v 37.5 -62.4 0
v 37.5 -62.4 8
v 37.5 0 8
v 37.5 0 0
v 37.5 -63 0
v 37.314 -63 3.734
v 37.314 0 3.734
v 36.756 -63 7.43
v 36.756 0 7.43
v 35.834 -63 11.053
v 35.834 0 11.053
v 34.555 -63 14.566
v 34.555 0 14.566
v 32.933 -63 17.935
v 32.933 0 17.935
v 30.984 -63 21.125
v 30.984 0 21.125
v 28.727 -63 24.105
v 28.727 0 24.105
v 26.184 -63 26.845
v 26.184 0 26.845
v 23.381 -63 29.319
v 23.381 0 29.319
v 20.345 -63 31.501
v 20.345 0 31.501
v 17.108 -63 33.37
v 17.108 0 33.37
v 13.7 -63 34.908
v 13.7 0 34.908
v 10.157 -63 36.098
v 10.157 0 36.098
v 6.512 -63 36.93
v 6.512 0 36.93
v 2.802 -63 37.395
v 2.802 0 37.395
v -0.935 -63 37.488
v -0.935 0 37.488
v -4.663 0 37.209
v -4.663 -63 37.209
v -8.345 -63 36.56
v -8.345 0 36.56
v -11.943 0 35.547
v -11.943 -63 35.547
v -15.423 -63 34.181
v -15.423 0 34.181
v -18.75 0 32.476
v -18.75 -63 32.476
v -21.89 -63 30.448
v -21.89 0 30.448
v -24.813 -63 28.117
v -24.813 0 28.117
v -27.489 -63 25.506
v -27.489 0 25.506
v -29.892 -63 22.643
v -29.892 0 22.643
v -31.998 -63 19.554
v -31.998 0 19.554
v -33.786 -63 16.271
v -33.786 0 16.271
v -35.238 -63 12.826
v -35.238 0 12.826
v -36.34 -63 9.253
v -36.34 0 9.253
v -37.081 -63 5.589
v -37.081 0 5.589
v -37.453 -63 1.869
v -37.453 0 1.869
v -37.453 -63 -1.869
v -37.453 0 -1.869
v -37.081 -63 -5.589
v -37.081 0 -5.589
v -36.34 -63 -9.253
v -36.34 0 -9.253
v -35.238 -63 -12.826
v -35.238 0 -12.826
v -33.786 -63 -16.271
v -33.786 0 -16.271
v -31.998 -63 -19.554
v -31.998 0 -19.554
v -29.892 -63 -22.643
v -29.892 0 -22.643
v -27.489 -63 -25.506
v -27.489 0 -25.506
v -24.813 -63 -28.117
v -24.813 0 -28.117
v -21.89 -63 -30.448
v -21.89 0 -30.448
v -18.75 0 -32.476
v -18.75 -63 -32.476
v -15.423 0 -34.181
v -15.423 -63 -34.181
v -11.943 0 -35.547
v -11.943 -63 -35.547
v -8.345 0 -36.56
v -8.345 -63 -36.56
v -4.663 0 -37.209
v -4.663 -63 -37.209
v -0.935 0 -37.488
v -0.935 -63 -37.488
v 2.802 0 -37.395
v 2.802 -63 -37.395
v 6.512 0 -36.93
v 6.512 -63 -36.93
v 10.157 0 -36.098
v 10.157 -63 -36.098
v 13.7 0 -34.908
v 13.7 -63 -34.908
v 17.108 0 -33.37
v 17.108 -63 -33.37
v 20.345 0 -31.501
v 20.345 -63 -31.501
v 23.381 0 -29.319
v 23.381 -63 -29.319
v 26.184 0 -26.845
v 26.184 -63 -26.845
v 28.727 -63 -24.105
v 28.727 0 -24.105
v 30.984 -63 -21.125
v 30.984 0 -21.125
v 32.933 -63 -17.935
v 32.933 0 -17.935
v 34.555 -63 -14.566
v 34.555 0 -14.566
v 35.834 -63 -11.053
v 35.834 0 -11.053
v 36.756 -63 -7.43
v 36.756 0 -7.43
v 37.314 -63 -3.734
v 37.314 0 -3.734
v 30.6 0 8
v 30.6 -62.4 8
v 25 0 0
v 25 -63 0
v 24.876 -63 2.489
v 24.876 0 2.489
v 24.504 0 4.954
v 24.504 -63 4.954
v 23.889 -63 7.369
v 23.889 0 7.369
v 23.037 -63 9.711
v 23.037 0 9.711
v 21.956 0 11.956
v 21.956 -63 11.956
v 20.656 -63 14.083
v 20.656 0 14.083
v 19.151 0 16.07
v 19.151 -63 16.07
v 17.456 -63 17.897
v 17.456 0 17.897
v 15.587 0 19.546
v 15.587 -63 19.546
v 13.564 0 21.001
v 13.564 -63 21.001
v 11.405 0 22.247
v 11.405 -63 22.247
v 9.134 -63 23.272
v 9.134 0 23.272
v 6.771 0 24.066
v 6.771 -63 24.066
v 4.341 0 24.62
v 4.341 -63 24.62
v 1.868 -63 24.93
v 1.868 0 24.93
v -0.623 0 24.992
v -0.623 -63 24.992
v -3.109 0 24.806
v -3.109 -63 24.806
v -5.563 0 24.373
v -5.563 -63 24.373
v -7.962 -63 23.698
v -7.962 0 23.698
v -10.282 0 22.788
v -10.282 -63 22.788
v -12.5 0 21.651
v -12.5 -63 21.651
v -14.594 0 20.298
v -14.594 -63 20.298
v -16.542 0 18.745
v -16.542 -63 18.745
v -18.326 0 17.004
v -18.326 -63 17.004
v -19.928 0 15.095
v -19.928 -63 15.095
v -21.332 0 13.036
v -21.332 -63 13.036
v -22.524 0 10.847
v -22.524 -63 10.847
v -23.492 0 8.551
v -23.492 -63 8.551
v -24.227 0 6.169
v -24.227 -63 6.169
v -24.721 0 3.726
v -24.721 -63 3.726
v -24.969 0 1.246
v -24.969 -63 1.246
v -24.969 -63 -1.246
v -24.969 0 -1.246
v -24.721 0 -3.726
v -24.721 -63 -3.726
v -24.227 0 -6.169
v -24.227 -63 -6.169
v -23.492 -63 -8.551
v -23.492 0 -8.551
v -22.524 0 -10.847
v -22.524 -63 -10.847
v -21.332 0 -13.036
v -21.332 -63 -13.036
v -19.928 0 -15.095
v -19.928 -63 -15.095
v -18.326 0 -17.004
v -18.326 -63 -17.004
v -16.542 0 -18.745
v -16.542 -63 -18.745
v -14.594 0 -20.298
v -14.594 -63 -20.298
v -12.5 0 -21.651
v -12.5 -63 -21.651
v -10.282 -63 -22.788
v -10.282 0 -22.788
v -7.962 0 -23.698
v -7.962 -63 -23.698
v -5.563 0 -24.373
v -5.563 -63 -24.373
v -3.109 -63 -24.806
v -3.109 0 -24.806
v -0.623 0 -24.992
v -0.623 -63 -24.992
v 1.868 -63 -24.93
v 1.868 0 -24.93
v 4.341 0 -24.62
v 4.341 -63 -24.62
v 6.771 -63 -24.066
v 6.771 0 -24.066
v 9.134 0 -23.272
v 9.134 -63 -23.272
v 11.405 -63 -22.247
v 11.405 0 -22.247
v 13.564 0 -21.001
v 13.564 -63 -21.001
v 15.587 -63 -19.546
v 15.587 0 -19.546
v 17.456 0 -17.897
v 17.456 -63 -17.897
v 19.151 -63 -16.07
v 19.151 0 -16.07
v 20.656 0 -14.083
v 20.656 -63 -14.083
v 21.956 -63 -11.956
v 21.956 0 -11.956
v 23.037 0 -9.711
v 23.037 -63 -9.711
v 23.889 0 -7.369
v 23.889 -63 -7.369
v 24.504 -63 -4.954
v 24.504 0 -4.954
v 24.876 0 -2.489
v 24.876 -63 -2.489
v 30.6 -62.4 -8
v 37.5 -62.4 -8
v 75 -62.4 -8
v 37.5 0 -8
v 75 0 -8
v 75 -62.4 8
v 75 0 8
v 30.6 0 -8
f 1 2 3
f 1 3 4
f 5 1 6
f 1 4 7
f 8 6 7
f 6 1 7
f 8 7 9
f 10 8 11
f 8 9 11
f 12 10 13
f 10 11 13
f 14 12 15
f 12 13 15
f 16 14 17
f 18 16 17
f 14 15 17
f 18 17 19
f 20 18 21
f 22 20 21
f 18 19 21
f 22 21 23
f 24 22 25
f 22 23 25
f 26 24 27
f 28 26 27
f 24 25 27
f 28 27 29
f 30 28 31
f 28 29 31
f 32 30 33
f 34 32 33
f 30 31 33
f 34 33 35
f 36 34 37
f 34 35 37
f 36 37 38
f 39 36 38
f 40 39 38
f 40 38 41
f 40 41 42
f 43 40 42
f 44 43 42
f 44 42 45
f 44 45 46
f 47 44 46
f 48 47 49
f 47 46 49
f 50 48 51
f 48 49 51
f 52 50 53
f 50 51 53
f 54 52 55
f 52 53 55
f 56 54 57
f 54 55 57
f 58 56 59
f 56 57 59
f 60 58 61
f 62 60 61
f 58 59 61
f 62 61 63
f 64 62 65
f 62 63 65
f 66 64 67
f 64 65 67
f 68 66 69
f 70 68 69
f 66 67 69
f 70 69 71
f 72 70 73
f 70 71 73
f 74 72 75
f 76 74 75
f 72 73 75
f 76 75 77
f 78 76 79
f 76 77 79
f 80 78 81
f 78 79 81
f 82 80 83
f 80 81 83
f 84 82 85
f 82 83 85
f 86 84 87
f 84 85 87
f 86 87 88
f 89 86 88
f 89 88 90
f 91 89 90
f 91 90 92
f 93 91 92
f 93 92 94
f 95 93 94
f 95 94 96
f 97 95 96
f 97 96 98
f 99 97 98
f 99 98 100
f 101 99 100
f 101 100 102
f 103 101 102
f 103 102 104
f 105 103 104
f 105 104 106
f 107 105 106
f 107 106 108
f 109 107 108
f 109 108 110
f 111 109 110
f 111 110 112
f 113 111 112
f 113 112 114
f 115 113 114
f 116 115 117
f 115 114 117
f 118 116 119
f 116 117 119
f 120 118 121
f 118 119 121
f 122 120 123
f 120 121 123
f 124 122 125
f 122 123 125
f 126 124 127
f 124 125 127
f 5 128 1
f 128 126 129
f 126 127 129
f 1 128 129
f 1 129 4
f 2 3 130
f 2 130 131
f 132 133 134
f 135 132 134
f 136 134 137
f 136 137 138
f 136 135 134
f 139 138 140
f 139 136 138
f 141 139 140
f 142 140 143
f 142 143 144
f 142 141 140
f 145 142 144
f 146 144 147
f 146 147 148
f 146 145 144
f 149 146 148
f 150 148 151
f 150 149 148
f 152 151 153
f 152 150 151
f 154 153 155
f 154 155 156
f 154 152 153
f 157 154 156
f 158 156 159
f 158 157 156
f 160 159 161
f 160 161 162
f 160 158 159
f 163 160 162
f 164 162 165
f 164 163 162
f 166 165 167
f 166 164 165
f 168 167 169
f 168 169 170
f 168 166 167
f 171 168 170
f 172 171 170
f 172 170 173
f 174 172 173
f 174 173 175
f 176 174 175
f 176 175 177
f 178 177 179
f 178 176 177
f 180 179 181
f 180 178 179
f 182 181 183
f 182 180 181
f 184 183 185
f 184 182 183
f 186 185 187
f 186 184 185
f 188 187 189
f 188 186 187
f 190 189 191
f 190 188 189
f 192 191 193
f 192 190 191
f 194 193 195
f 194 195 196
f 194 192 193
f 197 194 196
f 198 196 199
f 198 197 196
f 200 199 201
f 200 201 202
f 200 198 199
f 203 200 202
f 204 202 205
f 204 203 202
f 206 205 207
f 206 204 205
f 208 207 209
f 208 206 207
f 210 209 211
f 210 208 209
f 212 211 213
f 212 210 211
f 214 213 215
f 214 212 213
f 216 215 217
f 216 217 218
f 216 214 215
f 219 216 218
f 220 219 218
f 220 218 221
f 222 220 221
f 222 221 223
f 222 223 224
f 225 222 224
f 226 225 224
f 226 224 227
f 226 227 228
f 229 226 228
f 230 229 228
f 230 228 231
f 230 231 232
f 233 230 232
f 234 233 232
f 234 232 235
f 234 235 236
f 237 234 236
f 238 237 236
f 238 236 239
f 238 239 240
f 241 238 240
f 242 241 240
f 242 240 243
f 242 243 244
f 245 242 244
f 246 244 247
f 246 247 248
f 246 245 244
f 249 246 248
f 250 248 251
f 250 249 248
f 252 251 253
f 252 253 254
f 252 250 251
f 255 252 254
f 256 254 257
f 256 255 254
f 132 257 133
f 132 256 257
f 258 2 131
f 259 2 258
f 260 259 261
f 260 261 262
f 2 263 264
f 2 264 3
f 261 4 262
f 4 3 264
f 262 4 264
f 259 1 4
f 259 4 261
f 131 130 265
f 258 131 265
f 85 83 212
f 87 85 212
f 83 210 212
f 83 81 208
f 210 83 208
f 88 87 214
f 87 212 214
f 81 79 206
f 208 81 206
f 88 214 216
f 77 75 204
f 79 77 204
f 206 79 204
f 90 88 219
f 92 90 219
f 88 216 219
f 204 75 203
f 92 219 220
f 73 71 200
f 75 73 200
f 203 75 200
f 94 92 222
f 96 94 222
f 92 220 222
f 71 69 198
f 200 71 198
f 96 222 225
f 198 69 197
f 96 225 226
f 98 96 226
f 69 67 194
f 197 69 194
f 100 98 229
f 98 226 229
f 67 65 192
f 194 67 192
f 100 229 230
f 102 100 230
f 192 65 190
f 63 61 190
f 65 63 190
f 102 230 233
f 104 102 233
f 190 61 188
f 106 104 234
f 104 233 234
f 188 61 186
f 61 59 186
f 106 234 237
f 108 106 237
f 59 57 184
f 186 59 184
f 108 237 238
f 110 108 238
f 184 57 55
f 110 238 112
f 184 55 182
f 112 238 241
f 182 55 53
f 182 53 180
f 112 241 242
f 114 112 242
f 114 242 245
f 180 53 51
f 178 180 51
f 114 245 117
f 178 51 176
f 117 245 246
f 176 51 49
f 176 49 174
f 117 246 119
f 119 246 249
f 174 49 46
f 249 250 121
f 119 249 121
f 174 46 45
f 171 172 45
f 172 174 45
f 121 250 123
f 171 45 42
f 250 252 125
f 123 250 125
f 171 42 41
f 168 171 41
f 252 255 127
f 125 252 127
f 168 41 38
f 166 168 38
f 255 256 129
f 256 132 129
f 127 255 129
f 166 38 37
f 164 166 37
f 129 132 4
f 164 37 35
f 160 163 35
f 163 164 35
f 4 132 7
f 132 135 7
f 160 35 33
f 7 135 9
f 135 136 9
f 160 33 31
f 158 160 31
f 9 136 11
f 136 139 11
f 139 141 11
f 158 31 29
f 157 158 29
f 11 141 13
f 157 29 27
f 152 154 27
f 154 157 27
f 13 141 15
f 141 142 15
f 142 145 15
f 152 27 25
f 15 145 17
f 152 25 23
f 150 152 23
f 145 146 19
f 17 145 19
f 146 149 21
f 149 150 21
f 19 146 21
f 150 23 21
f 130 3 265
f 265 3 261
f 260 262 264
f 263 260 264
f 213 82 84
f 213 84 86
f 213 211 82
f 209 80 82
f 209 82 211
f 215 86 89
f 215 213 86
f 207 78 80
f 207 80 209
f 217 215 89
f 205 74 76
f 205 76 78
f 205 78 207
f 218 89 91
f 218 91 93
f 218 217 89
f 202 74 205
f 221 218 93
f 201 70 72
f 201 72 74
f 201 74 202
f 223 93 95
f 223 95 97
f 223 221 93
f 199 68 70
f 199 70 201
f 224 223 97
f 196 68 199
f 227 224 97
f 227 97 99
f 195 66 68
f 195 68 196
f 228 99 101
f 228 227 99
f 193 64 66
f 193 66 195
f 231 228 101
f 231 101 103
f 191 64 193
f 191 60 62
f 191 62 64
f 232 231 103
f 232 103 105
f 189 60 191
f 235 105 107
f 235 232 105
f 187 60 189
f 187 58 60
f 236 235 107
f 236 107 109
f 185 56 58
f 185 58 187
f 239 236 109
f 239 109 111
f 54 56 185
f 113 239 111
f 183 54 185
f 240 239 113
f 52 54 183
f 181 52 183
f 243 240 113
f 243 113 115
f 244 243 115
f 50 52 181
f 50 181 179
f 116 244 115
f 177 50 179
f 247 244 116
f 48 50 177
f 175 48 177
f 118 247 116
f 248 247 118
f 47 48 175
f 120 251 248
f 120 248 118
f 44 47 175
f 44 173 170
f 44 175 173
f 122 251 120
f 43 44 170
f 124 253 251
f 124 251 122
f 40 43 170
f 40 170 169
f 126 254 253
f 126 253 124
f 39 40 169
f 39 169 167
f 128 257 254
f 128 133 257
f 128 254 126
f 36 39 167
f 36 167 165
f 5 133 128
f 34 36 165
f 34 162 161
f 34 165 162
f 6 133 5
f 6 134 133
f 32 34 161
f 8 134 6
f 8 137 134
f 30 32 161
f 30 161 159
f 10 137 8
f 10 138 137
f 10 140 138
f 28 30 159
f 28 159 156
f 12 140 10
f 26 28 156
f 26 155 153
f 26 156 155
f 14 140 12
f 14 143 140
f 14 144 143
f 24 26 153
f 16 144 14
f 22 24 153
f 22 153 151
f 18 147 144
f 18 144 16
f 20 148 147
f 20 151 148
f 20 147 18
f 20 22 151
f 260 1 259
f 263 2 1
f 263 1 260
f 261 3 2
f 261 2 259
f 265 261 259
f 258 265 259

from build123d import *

# Parameters (mm, degrees)
F0_R     = 37.5
F0_R_2   = 25
F1_DEPTH = 63
F3_DEPTH = 62.4
F4_DEPTH = 6.9


with BuildPart() as f1:
    # F0 (on Front) → F1 (new body)
    with BuildSketch(Plane.XZ):
        Circle(F0_R)
        Circle(F0_R_2, mode=Mode.SUBTRACT)
    extrude(amount=F1_DEPTH)

    # F2 (on Front) → F3 (join)
    with BuildSketch(Plane.XZ):
        Polygon((75, -8), (75, 0), (75, 8), (37.5, 8), (37.5, -8), align=None)
    extrude(amount=F3_DEPTH)


with BuildPart() as f4:
    # F4 (new): faces of the model
    f4_faces = [f1.part.faces().sort_by_distance(p)[0] for p in [
        (37.5, -31.2, 4),
        (37.5, -31.2, -4),
    ]]
    extrude(f4_faces, amount=F4_DEPTH)


solid = Compound([f1.part, f4.part])
